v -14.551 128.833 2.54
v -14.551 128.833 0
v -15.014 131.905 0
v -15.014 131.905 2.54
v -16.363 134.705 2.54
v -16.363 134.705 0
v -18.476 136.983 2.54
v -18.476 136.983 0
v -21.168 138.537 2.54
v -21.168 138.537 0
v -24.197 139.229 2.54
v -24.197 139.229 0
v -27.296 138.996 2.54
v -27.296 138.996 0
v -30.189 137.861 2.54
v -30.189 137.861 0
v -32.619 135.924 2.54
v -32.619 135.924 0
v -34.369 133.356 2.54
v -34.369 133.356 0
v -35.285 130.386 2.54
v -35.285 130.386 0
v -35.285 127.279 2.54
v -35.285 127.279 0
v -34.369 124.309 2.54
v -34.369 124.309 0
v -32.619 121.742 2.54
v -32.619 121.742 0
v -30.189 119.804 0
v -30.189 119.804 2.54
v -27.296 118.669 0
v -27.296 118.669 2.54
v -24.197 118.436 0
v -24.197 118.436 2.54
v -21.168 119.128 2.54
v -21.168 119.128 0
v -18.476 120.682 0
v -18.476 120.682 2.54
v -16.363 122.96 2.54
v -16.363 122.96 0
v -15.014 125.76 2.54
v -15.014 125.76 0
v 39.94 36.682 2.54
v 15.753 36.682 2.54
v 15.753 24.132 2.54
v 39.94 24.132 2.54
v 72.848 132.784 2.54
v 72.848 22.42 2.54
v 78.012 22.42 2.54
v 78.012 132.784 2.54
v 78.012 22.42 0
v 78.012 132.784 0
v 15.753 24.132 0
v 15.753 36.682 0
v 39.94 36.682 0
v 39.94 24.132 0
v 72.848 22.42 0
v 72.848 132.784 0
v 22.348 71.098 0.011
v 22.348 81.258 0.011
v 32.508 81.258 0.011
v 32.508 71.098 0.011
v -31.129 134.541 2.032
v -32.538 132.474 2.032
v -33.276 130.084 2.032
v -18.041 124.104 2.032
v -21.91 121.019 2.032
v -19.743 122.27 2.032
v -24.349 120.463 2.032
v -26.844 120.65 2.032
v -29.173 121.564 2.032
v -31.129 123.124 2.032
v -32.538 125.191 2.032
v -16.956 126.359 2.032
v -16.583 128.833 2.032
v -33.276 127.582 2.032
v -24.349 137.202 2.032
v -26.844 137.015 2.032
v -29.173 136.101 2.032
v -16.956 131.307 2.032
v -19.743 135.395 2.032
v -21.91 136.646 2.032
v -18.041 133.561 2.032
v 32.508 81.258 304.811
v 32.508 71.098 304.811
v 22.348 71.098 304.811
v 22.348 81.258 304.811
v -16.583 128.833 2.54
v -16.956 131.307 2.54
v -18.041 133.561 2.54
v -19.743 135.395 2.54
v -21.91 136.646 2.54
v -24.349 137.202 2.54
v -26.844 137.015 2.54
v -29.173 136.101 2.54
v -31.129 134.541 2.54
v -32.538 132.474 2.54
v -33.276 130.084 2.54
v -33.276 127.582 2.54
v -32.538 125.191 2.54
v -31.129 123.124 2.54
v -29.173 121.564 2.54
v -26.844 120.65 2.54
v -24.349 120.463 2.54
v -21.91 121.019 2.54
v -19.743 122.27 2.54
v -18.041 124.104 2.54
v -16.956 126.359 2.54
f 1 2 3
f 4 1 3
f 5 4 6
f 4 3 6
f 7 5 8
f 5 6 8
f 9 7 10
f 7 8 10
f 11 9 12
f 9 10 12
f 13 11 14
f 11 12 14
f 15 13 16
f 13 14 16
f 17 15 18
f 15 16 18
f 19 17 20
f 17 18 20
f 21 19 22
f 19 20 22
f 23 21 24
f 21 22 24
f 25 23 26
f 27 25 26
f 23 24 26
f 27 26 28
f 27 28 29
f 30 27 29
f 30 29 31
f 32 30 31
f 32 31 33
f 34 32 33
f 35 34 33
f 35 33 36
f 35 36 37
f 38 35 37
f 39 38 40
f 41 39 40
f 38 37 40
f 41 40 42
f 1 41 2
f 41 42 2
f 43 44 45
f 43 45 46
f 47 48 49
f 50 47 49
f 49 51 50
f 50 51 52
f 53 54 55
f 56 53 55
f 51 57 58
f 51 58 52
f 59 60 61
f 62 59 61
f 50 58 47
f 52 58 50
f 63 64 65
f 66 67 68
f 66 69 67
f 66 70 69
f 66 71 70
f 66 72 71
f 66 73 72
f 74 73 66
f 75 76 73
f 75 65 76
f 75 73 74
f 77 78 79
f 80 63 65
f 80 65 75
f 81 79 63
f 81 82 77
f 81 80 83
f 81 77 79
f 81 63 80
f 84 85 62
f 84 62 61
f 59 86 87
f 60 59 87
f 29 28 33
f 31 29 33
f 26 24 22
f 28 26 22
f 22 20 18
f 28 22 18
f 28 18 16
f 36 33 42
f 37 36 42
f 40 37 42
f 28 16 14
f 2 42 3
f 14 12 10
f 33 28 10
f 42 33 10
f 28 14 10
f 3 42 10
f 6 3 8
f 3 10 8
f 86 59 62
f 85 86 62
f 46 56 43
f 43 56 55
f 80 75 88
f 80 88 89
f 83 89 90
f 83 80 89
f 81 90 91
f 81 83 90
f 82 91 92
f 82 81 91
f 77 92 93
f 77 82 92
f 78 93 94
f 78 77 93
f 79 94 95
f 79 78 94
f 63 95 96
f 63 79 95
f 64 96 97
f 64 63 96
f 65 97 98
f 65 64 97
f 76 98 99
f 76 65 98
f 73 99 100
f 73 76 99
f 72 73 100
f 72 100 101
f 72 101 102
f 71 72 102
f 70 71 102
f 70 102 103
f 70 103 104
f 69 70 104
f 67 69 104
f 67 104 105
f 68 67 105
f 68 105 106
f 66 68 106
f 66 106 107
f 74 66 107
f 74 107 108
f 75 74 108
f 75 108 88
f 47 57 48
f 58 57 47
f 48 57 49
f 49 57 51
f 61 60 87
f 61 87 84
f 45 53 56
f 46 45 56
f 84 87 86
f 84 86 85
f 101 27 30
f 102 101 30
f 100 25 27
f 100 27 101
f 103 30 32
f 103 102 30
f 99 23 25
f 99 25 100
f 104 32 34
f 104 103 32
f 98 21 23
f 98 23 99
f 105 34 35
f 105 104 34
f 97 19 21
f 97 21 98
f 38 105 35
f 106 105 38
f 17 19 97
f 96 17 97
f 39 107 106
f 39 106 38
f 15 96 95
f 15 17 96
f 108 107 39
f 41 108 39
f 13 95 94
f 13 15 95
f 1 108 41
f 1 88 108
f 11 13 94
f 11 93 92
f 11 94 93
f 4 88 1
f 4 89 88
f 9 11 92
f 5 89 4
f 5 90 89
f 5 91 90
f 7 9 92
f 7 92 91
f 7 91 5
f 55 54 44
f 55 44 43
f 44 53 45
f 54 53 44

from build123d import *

# Parameters (mm, degrees)
F2_W     = 10.16
F2_H     = 10.16
F3_DEPTH = 304.8
F4_W     = 24.1876728833
F4_H     = 12.5502068549
F5_DEPTH = 2.54
F6_W     = 5.1632523537
F6_H     = 110.3644967079
F7_DEPTH = 2.54
F8_R     = 10.4253047929
F9_DEPTH = 2.54
F11_T    = -2.032


# Not quite as in the source:
# - a feature of the source that left no trace in its solid (it failed there, or was rolled back) is left out


with BuildPart() as f3:
    # F2 (on face) → F3 (new body)
    with BuildSketch(Plane.XY.offset(0.010535121)):
        with Locations((27.4280595768, 76.1781896186)):
            Rectangle(F2_W, F2_H)
    extrude(amount=F3_DEPTH)


with BuildPart() as f5:
    # F4 (on Top) → F5 (new body)
    with BuildSketch(Plane.XY):
        with Locations((27.8465393931, 30.4067051038)):
            Rectangle(F4_W, F4_H)
    extrude(amount=F5_DEPTH)


with BuildPart() as f7:
    # F6 (on Top) → F7 (new body)
    with BuildSketch(Plane.XY):
        with Locations((75.4299908876, 77.6021033525)):
            Rectangle(F6_W, F6_H)
    extrude(amount=F7_DEPTH)


with BuildPart() as f9:
    # F8 (on Top) → F9 (new body)
    with BuildSketch(Plane.XY):
        with Locations((-24.9763578176, 128.8325786591)):
            Circle(F8_R)
    extrude(amount=F9_DEPTH)

    # F11
    f11_openings = [f9.faces().sort_by_distance(p)[0] for p in [
        (-24.976358, 128.832579, 2.54),
    ]]
    offset(amount=F11_T, openings=f11_openings)


solid = Compound([f3.part, f5.part, f7.part, f9.part])
